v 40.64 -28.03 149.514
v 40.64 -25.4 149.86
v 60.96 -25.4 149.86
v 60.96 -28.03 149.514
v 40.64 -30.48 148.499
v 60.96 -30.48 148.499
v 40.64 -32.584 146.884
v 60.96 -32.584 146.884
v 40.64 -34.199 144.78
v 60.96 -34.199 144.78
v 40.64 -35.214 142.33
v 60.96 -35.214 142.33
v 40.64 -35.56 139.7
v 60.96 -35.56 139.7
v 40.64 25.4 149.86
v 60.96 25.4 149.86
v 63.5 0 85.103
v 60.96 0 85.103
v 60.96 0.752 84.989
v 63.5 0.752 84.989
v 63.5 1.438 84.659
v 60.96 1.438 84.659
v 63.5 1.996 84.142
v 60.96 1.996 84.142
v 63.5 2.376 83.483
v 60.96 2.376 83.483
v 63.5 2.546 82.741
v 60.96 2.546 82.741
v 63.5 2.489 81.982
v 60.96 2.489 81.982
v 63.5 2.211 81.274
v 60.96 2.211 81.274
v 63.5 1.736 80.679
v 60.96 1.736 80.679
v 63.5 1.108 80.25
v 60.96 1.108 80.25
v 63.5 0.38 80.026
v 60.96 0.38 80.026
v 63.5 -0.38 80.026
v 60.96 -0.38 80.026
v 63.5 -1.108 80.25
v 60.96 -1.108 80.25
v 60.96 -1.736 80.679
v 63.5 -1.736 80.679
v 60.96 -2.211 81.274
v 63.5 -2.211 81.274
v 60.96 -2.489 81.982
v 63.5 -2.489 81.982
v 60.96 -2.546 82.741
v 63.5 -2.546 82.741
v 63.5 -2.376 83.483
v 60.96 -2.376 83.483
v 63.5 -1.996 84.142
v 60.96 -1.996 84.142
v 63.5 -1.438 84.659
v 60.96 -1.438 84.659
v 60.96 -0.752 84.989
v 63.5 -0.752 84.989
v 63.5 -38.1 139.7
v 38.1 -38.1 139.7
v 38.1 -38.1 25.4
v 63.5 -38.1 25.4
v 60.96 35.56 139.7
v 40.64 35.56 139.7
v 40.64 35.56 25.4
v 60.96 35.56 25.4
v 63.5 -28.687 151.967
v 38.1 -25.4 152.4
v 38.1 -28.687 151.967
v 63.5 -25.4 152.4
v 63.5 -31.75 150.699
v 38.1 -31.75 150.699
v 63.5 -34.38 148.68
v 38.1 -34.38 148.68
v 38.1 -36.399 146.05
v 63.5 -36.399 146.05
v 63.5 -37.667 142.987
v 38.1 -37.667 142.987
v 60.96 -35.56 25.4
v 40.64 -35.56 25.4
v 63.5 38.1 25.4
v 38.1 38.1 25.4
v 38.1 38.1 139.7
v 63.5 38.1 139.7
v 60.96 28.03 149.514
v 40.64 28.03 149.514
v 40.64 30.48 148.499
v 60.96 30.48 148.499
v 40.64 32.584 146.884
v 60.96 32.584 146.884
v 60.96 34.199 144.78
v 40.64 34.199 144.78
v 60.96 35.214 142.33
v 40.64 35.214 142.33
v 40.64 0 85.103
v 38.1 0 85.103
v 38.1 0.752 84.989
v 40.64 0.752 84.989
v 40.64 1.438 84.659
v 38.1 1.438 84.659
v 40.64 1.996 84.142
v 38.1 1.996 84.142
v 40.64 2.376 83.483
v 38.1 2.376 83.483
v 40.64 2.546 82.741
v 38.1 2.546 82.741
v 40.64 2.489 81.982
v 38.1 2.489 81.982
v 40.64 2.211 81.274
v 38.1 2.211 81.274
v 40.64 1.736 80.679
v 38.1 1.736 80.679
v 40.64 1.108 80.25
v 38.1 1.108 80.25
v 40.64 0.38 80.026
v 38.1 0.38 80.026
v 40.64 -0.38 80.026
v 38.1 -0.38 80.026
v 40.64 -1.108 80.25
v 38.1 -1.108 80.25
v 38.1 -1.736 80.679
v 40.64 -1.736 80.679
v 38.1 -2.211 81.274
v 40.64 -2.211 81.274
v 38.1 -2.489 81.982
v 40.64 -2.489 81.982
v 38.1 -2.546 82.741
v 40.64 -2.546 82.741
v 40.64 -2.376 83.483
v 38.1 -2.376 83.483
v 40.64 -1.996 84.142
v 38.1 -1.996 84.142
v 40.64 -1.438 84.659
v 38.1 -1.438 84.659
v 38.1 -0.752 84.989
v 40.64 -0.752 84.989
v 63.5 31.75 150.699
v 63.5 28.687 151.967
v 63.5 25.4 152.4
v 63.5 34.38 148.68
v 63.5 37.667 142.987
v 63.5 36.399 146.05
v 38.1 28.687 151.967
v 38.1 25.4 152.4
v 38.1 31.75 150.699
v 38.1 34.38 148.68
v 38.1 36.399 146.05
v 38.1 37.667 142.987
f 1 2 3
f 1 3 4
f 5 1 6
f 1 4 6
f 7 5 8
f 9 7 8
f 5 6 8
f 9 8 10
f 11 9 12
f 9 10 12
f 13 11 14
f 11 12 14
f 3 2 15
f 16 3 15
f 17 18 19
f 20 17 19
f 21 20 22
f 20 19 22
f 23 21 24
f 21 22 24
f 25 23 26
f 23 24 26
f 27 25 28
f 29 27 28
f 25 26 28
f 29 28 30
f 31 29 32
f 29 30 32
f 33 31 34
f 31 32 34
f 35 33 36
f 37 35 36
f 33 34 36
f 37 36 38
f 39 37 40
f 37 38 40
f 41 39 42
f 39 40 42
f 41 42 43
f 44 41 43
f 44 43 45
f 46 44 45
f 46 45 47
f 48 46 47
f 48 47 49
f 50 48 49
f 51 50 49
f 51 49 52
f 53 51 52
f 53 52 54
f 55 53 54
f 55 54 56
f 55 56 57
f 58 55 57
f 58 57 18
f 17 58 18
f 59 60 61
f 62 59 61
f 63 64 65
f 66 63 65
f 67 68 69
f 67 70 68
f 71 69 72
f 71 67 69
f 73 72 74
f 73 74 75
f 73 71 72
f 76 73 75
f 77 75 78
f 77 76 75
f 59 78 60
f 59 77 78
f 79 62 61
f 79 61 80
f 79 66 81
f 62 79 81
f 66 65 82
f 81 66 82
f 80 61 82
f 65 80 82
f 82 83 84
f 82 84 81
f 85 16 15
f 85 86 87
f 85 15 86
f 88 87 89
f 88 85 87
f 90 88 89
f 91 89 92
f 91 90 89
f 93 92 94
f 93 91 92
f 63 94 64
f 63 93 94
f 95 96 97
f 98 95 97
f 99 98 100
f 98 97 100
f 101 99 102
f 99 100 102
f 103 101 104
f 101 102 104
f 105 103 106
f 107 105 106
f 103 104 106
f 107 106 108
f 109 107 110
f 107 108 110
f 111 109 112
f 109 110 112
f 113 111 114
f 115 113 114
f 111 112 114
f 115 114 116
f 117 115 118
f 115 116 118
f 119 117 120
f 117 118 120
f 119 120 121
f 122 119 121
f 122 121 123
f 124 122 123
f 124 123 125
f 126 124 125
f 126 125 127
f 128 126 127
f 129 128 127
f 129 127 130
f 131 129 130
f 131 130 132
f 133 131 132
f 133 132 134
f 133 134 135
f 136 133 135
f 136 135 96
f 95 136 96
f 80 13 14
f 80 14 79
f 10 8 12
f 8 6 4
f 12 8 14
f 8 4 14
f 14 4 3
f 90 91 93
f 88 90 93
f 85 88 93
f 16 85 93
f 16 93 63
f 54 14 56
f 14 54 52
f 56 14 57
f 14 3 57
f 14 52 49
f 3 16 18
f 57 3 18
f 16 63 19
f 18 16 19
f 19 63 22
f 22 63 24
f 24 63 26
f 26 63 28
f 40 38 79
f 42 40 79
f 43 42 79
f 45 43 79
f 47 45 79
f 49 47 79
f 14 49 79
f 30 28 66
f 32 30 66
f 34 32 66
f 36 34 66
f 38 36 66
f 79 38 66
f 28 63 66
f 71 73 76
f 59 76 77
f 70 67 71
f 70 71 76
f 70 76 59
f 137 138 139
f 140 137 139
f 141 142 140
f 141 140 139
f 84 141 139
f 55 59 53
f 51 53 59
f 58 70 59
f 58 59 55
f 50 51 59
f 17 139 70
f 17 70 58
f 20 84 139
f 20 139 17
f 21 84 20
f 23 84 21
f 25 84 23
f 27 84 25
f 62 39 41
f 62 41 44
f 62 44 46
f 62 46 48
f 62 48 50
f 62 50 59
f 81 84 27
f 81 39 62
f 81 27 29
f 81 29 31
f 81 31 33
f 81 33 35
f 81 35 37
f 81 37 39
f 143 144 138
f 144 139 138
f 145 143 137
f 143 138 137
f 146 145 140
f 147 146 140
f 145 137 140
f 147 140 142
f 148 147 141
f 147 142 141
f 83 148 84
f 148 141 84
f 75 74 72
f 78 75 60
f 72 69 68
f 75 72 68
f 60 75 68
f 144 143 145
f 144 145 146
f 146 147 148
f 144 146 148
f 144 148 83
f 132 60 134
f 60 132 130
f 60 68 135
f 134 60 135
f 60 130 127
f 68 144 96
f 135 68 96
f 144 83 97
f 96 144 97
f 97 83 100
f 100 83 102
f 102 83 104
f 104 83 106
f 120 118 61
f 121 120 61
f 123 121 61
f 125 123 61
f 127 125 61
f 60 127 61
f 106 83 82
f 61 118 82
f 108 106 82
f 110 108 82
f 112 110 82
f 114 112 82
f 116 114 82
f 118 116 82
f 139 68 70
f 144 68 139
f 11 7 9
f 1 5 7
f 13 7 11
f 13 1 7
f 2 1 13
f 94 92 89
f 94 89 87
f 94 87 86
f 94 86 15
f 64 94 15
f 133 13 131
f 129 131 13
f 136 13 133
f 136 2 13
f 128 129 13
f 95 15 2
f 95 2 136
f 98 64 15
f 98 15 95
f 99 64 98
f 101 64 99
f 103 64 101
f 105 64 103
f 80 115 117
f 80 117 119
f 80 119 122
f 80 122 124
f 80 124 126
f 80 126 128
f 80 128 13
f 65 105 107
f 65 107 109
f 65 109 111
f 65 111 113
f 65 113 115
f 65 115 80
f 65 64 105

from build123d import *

# Parameters (mm, degrees)
F0_W     = 127
F0_H     = 76.2
F1_DEPTH = 25.4
F3_R     = 12.7
F4_T     = -2.54
F6_D     = 5.1054
F7_ANGLE = 90


with BuildPart() as f1:
    # F0 (on Top) → F1 (new body)
    with BuildSketch(Plane.XY):
        Rectangle(F0_W, F0_H)
    extrude(amount=F1_DEPTH)

    # F3
    f3_edges = [f1.edges().sort_by_distance(p)[0] for p in [
        (-63.5, -38.1, 12.7),
        (-63.5, 38.1, 12.7),
    ]]
    fillet(f3_edges, radius=F3_R)

    # F4
    f4_openings = [f1.faces().sort_by_distance(p)[0] for p in [
        (63.5, 0, 12.7),
    ]]
    offset(amount=F4_T, openings=f4_openings)

    # F6 (through all)
    with Locations(Plane.XY.offset(25.4)):
        with Locations((6.35, 0)):
            Hole(F6_D / 2)


with BuildPart() as f1_1:
    # F7: moved
    add(f1.part.rotate(Axis((63.5, 0, 25.4), (0, 1, 0)), F7_ANGLE))


solid = f1_1.part
